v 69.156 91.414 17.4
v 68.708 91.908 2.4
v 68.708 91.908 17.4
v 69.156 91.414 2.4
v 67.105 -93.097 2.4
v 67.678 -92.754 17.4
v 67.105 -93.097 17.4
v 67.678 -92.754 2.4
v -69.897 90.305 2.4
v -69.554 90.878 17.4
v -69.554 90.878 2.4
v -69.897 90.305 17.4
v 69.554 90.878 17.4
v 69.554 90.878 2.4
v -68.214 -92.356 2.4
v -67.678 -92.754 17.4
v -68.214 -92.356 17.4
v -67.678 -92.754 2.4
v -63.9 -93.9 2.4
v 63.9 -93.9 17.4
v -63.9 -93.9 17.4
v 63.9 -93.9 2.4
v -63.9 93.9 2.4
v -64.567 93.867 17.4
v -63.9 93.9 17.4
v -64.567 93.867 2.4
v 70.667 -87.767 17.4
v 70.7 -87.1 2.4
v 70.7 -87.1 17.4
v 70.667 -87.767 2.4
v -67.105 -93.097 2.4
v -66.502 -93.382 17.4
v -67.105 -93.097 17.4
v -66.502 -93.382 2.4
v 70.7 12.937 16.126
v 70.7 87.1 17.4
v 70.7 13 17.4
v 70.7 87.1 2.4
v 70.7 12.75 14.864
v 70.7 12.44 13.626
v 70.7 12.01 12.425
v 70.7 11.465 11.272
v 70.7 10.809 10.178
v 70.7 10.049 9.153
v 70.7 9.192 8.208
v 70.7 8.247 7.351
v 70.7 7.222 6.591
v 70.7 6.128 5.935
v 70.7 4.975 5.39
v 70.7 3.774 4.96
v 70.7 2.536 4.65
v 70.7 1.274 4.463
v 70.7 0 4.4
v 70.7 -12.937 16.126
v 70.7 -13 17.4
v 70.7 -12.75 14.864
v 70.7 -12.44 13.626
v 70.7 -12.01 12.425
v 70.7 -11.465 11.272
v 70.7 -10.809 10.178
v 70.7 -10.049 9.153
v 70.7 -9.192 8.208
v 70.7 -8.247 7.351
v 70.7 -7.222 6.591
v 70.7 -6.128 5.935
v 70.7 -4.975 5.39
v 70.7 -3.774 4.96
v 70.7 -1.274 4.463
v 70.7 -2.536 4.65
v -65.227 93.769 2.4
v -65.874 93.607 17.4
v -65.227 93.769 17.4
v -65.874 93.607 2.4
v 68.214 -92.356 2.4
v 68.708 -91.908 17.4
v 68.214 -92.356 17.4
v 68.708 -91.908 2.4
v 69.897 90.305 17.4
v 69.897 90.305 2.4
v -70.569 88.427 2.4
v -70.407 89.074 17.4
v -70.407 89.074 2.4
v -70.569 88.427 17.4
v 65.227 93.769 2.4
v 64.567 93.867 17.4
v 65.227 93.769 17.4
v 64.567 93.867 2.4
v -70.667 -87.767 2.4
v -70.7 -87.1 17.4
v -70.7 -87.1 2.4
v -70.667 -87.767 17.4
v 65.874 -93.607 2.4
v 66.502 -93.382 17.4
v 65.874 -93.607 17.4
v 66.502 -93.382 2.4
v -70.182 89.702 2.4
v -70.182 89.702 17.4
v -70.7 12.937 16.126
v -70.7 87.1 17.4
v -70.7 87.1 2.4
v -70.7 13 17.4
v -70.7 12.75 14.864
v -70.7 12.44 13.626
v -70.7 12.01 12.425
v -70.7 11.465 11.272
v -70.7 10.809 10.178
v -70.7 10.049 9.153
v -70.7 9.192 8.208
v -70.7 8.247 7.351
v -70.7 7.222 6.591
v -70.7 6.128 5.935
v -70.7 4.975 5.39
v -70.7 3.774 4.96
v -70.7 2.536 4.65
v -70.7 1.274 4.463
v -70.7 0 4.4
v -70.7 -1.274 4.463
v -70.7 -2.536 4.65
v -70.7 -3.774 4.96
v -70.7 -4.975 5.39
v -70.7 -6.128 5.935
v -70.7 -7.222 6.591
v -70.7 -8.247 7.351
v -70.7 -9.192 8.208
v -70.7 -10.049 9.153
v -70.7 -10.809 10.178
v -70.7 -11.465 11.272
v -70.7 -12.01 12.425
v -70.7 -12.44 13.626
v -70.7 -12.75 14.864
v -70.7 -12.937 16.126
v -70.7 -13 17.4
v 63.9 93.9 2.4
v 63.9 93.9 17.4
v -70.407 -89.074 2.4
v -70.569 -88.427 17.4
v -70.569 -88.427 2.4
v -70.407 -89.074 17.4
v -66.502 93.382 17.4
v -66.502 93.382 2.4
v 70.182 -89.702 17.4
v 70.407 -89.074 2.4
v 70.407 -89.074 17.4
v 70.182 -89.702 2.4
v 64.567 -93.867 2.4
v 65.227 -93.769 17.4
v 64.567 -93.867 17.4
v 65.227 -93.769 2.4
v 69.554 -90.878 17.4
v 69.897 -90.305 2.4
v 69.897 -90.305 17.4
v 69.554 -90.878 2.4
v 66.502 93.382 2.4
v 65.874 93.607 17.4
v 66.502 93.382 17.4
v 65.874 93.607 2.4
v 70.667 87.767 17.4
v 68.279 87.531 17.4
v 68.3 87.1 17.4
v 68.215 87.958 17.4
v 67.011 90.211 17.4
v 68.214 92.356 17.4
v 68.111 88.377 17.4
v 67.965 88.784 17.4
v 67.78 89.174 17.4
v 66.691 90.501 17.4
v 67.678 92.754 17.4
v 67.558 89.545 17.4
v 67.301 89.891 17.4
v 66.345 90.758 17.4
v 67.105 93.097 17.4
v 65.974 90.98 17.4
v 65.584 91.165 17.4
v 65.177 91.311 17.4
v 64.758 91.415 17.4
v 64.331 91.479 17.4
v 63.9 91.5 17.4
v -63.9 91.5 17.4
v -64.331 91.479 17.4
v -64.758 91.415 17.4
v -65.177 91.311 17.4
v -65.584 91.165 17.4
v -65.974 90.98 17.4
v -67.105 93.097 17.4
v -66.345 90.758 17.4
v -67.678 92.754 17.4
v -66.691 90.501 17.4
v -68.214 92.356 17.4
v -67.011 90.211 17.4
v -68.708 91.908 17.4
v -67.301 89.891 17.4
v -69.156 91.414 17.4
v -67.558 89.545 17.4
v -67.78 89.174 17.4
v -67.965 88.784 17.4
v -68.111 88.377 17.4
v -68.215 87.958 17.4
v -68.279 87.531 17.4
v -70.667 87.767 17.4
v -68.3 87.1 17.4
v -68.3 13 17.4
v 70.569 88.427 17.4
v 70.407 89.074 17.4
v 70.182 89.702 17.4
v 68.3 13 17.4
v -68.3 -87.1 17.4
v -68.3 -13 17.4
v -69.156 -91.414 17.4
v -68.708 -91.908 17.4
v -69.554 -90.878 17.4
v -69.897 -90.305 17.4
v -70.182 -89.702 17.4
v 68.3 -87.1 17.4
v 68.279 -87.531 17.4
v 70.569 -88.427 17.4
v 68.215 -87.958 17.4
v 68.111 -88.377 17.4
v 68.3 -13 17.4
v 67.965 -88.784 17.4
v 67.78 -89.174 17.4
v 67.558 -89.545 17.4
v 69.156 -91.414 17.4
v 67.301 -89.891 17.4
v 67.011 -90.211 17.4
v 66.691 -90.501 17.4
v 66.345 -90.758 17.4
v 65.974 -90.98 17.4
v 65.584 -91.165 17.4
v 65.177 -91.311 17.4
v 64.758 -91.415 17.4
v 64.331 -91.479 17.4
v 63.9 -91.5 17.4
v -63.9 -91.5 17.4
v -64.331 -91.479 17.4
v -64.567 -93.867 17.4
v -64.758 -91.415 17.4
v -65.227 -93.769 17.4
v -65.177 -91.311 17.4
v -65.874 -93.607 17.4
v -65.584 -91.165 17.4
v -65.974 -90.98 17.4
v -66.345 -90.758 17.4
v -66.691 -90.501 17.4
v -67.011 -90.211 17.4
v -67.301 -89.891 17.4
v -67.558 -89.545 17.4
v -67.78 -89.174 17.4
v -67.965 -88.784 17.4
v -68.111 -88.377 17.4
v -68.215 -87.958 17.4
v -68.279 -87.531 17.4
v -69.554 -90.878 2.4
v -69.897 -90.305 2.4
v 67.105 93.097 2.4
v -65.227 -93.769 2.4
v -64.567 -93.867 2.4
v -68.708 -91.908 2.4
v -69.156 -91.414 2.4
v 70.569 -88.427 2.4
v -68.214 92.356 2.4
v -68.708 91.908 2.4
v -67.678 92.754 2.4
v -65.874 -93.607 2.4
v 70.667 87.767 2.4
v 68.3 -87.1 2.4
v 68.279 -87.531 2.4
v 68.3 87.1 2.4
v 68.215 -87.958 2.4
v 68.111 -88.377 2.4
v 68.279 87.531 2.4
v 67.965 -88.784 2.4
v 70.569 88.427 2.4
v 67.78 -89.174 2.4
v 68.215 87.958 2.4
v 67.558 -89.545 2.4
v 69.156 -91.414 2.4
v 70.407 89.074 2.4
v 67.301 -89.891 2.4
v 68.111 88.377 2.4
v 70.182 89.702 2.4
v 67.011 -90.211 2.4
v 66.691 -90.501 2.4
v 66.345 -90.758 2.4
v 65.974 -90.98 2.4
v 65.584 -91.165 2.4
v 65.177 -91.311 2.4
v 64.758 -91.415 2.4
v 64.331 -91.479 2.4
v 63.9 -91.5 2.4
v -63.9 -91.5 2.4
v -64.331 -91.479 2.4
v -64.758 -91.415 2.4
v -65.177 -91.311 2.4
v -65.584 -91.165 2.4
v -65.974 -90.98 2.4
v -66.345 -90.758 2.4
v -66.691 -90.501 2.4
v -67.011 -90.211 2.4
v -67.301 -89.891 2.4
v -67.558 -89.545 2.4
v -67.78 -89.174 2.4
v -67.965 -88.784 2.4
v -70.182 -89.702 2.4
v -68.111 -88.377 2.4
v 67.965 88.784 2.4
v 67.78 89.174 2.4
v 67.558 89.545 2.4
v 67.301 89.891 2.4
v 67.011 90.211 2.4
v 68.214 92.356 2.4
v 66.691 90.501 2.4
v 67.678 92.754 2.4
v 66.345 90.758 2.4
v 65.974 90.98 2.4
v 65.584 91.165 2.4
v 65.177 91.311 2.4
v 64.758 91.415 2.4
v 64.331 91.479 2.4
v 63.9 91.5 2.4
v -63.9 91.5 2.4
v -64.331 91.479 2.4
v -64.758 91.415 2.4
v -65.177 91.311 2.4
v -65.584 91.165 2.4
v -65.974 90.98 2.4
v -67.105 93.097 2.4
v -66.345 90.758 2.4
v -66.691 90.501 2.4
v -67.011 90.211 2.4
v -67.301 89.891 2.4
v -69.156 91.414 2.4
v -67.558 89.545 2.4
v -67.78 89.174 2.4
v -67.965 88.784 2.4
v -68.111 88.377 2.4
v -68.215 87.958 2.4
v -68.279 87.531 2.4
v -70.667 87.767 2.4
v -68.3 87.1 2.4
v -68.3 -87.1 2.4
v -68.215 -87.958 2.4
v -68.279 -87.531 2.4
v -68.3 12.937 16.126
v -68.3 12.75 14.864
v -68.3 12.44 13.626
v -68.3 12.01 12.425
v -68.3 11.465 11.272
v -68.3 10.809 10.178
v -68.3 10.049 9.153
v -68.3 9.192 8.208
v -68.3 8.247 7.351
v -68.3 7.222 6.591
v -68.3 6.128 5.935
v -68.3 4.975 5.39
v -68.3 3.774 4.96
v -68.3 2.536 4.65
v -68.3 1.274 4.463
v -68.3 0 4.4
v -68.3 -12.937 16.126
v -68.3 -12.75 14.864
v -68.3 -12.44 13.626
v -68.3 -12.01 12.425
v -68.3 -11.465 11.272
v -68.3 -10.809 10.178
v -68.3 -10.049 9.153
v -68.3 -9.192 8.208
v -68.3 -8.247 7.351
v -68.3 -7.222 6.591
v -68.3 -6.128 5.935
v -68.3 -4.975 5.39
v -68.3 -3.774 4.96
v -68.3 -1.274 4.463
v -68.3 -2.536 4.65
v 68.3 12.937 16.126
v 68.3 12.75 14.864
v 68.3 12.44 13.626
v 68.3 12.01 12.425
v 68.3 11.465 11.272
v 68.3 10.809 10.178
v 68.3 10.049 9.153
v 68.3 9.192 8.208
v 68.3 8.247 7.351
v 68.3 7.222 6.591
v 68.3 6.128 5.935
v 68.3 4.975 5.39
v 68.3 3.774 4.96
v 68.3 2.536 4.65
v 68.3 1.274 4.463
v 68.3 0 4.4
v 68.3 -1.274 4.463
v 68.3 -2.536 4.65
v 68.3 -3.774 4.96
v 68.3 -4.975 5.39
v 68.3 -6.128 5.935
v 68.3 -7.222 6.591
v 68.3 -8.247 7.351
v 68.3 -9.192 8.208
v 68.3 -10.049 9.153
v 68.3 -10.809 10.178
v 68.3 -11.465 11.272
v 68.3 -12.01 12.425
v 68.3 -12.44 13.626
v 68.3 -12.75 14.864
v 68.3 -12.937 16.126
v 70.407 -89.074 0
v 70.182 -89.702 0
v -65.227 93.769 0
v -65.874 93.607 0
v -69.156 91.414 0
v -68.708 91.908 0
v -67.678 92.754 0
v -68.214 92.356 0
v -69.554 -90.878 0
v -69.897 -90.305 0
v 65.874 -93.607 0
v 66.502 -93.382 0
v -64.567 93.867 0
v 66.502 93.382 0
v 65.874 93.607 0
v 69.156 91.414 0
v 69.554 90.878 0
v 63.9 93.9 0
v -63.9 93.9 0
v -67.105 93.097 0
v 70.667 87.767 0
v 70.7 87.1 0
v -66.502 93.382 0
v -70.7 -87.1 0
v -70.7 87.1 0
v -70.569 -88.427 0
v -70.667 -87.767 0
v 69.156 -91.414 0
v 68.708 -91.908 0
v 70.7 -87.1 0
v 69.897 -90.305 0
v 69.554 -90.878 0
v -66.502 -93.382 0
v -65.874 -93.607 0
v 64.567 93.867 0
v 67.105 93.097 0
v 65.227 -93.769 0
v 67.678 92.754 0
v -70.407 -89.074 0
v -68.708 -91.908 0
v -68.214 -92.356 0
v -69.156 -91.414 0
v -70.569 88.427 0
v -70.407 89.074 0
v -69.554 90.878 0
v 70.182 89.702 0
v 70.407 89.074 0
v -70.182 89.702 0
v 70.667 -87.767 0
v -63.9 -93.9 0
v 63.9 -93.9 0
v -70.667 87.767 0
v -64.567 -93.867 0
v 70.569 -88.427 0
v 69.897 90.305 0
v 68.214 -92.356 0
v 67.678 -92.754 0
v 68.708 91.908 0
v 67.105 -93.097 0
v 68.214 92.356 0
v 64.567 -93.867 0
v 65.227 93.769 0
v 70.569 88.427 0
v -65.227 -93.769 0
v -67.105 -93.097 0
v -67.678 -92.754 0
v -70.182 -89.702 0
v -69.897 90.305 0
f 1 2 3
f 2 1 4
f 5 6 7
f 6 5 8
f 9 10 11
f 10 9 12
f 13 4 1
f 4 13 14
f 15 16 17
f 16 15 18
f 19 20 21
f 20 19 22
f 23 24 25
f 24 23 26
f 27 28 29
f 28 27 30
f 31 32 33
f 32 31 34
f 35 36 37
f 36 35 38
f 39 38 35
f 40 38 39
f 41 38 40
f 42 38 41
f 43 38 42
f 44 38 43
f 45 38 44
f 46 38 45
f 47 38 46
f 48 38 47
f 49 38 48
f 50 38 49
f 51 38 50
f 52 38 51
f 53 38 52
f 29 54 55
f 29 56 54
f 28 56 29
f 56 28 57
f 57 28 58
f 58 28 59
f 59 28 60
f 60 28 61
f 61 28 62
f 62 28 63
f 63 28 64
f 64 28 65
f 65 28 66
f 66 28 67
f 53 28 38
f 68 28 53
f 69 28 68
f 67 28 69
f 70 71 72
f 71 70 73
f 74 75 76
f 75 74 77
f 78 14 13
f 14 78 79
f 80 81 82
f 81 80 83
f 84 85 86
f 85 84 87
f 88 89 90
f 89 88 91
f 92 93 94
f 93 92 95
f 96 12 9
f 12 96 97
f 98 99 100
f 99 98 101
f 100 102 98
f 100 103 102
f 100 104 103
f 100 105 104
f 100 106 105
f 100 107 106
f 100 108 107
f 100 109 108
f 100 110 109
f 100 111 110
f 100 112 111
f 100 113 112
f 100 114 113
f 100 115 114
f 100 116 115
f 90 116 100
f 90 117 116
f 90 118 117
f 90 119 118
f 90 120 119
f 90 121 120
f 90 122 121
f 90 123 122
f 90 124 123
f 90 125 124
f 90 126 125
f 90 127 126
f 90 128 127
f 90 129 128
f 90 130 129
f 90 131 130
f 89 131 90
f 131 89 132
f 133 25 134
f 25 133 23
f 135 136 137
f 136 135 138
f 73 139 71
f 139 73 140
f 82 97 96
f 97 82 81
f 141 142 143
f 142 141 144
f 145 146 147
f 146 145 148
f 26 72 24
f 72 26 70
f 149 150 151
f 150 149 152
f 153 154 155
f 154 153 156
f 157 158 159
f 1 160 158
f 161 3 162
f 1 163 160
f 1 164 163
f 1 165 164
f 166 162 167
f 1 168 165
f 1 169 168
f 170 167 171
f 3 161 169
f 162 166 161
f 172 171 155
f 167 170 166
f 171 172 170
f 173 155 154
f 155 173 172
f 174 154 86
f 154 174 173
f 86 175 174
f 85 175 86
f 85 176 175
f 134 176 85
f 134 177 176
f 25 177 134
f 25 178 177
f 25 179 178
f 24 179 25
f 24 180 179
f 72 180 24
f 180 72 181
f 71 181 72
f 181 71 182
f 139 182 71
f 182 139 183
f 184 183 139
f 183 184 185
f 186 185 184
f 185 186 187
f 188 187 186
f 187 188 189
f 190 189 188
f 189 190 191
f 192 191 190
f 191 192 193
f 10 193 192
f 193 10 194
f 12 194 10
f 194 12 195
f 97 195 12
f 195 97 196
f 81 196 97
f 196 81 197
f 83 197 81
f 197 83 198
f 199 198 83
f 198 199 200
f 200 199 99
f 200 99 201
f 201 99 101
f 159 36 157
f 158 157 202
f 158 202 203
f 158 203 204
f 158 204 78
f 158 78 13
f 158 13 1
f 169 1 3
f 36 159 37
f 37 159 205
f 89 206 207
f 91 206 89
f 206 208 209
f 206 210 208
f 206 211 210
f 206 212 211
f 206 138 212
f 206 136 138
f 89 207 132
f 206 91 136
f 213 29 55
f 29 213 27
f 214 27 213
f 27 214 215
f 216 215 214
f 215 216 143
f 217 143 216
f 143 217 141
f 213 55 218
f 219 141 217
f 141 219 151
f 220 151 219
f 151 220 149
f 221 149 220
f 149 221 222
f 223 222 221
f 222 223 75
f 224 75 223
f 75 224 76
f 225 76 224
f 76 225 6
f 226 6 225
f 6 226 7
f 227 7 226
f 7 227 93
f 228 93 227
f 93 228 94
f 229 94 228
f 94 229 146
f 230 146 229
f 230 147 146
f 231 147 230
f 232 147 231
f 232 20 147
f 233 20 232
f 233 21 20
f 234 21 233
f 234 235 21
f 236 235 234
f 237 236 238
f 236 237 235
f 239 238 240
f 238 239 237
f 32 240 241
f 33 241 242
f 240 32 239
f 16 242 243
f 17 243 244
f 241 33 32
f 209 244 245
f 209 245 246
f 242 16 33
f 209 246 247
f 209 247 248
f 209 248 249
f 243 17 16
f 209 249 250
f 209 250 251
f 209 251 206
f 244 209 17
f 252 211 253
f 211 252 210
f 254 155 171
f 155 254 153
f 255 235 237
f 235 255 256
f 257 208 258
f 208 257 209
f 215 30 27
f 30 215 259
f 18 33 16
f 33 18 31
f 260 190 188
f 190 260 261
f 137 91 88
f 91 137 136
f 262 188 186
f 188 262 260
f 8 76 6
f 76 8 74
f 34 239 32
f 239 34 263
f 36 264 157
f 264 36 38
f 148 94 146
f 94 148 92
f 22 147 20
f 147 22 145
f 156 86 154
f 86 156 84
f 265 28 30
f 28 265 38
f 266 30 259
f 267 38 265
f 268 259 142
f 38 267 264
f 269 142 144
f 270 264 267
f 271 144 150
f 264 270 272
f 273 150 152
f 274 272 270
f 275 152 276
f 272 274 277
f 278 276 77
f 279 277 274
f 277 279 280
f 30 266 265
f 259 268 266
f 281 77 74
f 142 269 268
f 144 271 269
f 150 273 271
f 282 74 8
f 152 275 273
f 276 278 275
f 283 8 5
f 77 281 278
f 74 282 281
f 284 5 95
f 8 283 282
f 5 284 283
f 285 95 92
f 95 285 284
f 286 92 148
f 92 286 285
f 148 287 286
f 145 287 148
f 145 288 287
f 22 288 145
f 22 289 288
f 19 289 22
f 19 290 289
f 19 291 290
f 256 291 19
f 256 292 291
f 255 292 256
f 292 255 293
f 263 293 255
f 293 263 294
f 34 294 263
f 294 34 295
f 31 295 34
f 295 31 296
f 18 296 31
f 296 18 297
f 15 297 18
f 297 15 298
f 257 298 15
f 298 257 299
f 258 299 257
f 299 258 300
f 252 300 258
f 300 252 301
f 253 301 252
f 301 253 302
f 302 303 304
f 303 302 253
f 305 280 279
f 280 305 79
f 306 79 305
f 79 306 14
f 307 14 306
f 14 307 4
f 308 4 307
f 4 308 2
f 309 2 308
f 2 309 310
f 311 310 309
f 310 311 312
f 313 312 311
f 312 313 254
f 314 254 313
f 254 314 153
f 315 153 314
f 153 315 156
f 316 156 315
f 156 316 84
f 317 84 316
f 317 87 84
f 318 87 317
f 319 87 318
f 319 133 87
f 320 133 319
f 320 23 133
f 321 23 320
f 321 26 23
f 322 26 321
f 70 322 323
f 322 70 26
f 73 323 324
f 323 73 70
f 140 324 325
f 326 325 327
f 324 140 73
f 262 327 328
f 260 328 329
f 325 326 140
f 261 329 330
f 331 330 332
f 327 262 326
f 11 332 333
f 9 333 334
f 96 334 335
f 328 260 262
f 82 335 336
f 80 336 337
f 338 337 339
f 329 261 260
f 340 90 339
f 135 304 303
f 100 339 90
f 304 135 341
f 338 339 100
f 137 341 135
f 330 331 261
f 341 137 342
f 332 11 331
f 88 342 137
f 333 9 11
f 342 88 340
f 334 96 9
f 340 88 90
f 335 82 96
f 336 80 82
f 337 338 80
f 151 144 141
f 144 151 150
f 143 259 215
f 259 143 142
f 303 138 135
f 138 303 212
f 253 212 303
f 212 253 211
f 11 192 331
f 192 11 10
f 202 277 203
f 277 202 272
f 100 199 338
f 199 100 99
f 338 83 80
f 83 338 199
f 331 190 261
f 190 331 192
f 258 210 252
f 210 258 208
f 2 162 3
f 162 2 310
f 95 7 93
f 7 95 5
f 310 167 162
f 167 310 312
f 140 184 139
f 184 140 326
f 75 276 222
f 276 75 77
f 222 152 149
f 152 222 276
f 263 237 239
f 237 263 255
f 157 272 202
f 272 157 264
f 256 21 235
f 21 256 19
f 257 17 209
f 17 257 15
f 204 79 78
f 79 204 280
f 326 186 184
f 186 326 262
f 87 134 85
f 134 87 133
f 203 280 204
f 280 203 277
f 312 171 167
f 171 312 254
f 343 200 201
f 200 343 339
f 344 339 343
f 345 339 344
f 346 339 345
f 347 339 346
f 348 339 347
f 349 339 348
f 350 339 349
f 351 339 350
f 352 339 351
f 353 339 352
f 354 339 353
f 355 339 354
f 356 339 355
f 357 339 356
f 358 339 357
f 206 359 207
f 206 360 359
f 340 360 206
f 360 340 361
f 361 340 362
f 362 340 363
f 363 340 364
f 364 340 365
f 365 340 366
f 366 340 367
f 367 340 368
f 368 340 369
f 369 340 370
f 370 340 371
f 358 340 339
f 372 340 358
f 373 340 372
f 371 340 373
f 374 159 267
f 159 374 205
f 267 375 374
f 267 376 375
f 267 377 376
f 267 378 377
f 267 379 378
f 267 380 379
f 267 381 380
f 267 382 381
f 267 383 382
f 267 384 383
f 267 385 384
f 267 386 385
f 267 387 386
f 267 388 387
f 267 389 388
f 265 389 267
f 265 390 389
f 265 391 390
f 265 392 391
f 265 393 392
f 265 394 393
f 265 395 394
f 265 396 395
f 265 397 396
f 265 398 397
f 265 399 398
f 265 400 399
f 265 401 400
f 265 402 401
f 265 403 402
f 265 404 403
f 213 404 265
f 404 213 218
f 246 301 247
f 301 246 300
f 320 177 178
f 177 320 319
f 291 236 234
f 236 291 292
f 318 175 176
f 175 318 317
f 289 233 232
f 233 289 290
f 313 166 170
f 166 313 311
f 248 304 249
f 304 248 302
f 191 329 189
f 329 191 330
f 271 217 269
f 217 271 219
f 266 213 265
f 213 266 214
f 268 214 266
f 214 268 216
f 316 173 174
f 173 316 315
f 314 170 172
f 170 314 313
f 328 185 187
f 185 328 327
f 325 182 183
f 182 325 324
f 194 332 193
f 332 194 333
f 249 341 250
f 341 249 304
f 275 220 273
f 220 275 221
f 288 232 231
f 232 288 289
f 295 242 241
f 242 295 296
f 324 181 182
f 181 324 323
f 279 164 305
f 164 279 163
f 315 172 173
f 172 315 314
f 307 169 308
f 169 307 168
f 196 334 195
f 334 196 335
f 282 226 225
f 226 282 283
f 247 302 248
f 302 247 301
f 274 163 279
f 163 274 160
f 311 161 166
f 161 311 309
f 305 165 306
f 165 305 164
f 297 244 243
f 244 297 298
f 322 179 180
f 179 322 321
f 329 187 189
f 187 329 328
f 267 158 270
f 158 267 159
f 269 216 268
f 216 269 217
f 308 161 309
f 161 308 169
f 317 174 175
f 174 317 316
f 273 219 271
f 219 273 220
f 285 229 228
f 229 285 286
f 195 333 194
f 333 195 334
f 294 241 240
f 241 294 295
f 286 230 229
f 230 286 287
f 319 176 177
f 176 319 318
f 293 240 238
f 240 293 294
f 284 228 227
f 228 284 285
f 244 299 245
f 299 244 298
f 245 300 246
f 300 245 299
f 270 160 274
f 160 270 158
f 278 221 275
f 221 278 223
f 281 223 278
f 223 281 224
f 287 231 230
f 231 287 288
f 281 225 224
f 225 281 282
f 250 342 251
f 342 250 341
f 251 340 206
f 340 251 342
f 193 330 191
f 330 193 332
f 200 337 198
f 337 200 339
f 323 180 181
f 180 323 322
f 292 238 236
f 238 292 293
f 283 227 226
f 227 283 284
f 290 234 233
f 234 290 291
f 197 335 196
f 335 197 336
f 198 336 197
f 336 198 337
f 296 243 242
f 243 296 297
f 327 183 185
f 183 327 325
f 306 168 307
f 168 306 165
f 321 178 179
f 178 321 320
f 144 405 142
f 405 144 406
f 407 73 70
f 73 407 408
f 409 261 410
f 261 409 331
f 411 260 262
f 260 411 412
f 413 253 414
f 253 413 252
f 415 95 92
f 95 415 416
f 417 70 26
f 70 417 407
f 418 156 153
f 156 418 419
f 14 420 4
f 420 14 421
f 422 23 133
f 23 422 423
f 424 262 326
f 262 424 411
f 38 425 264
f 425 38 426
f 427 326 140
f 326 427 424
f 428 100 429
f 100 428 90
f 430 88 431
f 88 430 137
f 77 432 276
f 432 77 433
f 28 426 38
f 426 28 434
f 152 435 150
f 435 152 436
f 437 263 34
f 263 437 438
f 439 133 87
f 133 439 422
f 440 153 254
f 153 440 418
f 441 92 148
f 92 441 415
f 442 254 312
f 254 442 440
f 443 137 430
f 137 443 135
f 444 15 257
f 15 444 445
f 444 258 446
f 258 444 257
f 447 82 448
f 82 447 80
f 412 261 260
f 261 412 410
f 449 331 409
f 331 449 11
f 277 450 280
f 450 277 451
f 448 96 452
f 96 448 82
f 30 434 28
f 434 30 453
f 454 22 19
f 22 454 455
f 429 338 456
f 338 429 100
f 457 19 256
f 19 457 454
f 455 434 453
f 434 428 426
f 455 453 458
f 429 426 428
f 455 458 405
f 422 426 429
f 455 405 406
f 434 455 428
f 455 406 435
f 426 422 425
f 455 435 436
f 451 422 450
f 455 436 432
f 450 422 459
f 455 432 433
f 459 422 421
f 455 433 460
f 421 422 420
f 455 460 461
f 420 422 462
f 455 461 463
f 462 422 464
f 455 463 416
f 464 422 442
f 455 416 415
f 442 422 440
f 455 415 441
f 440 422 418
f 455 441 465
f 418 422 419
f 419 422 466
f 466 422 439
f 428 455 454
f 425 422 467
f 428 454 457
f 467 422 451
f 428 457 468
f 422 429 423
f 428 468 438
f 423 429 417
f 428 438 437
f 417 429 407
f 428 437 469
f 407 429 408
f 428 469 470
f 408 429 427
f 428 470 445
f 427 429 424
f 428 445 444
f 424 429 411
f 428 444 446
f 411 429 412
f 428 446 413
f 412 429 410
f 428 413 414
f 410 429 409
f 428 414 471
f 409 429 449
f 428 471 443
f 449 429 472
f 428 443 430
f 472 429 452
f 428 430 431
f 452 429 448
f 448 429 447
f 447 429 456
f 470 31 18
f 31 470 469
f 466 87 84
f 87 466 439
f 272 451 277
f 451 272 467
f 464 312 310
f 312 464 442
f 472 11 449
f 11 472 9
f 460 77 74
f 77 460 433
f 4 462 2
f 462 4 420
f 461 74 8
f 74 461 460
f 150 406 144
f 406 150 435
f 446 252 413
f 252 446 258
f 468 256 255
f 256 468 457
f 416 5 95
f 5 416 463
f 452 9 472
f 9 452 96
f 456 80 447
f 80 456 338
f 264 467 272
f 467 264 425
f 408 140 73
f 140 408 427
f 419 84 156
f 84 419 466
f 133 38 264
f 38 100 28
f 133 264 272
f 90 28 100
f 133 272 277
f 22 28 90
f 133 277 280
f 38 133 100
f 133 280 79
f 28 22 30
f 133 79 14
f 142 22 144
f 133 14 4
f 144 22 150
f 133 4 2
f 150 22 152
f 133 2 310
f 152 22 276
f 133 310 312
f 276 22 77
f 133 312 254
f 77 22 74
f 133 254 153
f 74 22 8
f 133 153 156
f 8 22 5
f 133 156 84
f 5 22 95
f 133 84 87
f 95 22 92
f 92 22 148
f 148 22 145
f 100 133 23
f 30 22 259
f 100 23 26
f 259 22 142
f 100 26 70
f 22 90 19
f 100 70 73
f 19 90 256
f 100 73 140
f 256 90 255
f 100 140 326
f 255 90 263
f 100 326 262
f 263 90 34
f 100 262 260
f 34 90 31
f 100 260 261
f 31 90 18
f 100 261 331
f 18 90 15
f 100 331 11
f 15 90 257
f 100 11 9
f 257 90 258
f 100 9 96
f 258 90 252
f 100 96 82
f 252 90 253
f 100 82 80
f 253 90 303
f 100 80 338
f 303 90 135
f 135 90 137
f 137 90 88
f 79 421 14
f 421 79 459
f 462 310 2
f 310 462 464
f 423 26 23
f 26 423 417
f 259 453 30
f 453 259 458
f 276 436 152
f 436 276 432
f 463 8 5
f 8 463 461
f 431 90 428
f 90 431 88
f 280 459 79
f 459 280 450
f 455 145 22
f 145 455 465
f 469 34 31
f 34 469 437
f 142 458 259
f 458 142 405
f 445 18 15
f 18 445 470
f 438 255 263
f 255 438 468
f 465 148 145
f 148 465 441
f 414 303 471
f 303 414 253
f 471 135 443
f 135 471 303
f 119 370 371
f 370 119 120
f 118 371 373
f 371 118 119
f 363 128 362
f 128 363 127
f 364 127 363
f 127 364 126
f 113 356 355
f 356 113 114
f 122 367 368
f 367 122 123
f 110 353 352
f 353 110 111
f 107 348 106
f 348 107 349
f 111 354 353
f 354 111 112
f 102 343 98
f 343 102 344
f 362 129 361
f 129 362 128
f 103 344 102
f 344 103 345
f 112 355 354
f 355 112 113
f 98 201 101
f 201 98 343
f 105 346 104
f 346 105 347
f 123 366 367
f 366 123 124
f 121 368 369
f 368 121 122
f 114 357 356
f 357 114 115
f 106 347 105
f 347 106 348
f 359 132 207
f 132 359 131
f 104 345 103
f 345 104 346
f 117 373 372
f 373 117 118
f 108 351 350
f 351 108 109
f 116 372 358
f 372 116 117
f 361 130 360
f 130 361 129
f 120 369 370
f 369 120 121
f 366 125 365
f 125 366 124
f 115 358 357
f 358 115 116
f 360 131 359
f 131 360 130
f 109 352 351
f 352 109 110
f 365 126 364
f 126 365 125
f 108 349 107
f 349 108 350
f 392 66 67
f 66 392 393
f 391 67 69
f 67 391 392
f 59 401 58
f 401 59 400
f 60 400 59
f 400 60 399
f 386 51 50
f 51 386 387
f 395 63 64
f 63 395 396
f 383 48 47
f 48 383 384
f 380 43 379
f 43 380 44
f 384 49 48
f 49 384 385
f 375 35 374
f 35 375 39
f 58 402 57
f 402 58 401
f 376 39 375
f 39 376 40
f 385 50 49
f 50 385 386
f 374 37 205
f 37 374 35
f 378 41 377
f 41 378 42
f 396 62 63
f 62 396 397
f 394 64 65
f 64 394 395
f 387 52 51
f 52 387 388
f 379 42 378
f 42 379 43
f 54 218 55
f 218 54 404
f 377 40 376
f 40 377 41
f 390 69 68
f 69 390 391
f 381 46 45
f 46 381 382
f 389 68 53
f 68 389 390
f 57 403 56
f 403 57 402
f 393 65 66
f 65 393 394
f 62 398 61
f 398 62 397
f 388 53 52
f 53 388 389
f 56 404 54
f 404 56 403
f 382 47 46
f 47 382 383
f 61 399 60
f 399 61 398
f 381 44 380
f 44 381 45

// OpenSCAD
// file: ../scad/vial_vault.scad
// vial_vault.scad -- parametric dark-storage vial holder (tray + lift-off lid)
// Geometry variables + POCKETS list are supplied by build/<D>_geom.scad.
// PART is set by the wrapper (build/<D>_tray.scad / _lid.scad). NEVER re-assign PART here.
$fn = 64;

part_sel = is_undef(PART) ? "tray" : PART;   // read-only selector (see memory gotcha)

// ---- rounded rectangular prism, centred in XY, z=0..h ----
module rrect(sx, sy, h, r) {
    r = min(r, sx/2, sy/2);
    hull() for (dx = [r - sx/2, sx/2 - r], dy = [r - sy/2, sy/2 - r])
        translate([dx, dy, 0]) cylinder(r = r, h = h);
}

// ---- one pocket tube: solid cylinder w/ bored vial cavity from top ----
module pocket(p) {
    x = p[0]; y = p[1]; bore = p[2]; depth = p[3]; small = p[4];
    scal = len(p) > 5 ? p[5] : 0;
    tube_od = bore + 2 * PWALL;
    translate([x, y, BASE_T]) {
        difference() {
            cylinder(d = tube_od, h = TUBE_H);
            // vial cavity: bored from the tube top down by `depth`
            translate([0, 0, TUBE_H - depth])
                cylinder(d = bore, h = depth + 0.1);
            // lead-in chamfer at the bore mouth: funnels the vial in on the drop
            translate([0, 0, TUBE_H - 1.6])
                cylinder(d1 = bore, d2 = bore + 2.4, h = 1.7);
            // finger scallop on small pockets: side notch from rim down ~18mm,
            // pointed toward the box centre (never faces the perimeter wall)
            if (FINGER_SCALLOP && small == 1)
                rotate([0, 0, scal])
                    translate([tube_od/2 - 1.5, 0, TUBE_H - 18])
                        cylinder(d = bore * 0.55, h = 20);
        }
    }
}

module all_pockets() {
    for (p = POCKETS) pocket(p);
}

// ---- hand slots cut through the two short (X-facing) end walls ----
module hand_slots() {
    sw = 60; sh = 16; zc = RIM_H - 14;
    for (sx = [-1, 1])
        translate([sx * (OUTER_W/2), 0, zc]) rotate([90, 0, 90])
            linear_extrude(height = WALL * 4, center = true)
                offset(r = sh/2) square([sw - sh, 0.01], center = true);
}

module tray() {
    difference() {
        union() {
            // base slab (with a bottom outer chamfer for clean first-layer adhesion)
            hull() {
                translate([0, 0, 0.8])
                    rrect(OUTER_W, OUTER_L, BASE_T - 0.8, CORNER_R);
                rrect(OUTER_W - 1.6, OUTER_L - 1.6, 0.6, CORNER_R);
            }
            // perimeter wall (hollow frame)
            difference() {
                rrect(OUTER_W, OUTER_L, RIM_H, CORNER_R);
                translate([0, 0, BASE_T])
                    rrect(OUTER_W - 2*WALL, OUTER_L - 2*WALL, RIM_H, max(0.5, CORNER_R - WALL));
            }
            // pocket tubes
            all_pockets();
        }
        if (HAND_SLOTS) hand_slots();
    }
}

module lid() {
    lw = OUTER_W + 2 * (LID_GAP + SKIRT_W);
    ll = OUTER_L + 2 * (LID_GAP + SKIRT_W);
    lr = CORNER_R + LID_GAP + SKIRT_W;
    // printed roof-down: roof plate at z=0, skirt rising in +z
    difference() {
        union() {
            rrect(lw, ll, ROOF_T, lr);                      // roof
            translate([0, 0, ROOF_T])
                difference() {                              // skirt wall
                    rrect(lw, ll, SKIRT_H, lr);
                    translate([0, 0, -0.1])
                        rrect(OUTER_W + 2*LID_GAP, OUTER_L + 2*LID_GAP, SKIRT_H + 0.2,
                              CORNER_R + LID_GAP);
                }
        }
        // finger-pull scallops on both short (X) ends of the skirt for easy lift-off
        for (sx = [-1, 1])
            translate([sx * lw/2, 0, ROOF_T + SKIRT_H])
                scale([1, 1, 1]) rotate([90, 0, 90])
                    cylinder(d = 26, h = SKIRT_W * 4, center = true);
    }
}

// ---- fit-audit cutaway: tray sliced at y=0 with reference vials at rest height ----
module ghost_vials() {
    for (p = POCKETS) {
        x = p[0]; y = p[1]; bore = p[2]; depth = p[3];
        vial_od = bore - 3;                 // nominal vial OD (bore minus clearance)
        vial_h  = depth - 2;                // nominal vial height (depth minus bore-gap)
        rest_z  = BASE_T + (TUBE_H - depth); // pedestal top the vial sits on
        translate([x, y, rest_z]) cylinder(d = max(2, vial_od), h = vial_h);
    }
}

module section() {
    difference() {
        union() {
            tray();
            // reference vials shown translucent-ish (own color) to check seating
            color([0.85, 0.2, 0.2]) ghost_vials();
        }
        // cut away the +Y half to expose the interior
        translate([-(OUTER_W + 40)/2, 0, -1])
            cube([OUTER_W + 40, OUTER_L + 40, RIM_H + 40]);
    }
}

if (part_sel == "tray") tray();
else if (part_sel == "lid") lid();
else if (part_sel == "section") section();
else { tray(); }
// file: A_geom.scad
// AUTO-GENERATED by layout.py for design A. Do not edit by hand.
DESIGN = "A";
OUTER_W = 135.8;
OUTER_L = 182.2;
RIM_H = 95.0;
TUBE_H = 84.0;
BASE_T = 3.0;
WALL = 3.0;
PWALL = 2.0;
CORNER_R = 4.0;
LID_GAP = 0.4;
SKIRT_W = 2.4;
SKIRT_H = 15.0;
ROOF_T = 2.4;
HAND_SLOTS = false;
FINGER_SCALLOP = true;
POCKETS = [
  [-20.3, -64.1, 36.0, 80.0, 0, 72.4],
  [20.3, -64.1, 36.0, 80.0, 0, 107.6],
  [-45.9, -24.1, 26.0, 57.0, 0, 27.7],
  [-15.3, -24.1, 26.0, 57.0, 0, 57.6],
  [15.3, -24.1, 26.0, 57.0, 0, 122.4],
  [45.9, -24.1, 26.0, 57.0, 0, 152.3],
  [-9.3, 4.9, 14.0, 67.0, 1, -27.8],
  [9.3, 4.9, 14.0, 67.0, 1, -152.2],
  [-9.3, 23.5, 14.0, 67.0, 1, -68.4],
  [9.3, 23.5, 14.0, 67.0, 1, -111.6],
  [-35.4, 49.0, 19.0, 47.0, 1, -54.2],
  [-11.8, 49.0, 19.0, 47.0, 1, -76.5],
  [11.8, 49.0, 19.0, 47.0, 1, -103.5],
  [35.4, 49.0, 19.0, 47.0, 1, -125.8],
  [-35.4, 72.6, 19.0, 47.0, 1, -64.0],
  [-11.8, 72.6, 19.0, 47.0, 1, -80.8],
  [11.8, 72.6, 19.0, 47.0, 1, -99.2],
  [35.4, 72.6, 19.0, 47.0, 1, -116.0],
];
// main file
PART = "lid";
include <A_geom.scad>
include <../scad/vial_vault.scad>
